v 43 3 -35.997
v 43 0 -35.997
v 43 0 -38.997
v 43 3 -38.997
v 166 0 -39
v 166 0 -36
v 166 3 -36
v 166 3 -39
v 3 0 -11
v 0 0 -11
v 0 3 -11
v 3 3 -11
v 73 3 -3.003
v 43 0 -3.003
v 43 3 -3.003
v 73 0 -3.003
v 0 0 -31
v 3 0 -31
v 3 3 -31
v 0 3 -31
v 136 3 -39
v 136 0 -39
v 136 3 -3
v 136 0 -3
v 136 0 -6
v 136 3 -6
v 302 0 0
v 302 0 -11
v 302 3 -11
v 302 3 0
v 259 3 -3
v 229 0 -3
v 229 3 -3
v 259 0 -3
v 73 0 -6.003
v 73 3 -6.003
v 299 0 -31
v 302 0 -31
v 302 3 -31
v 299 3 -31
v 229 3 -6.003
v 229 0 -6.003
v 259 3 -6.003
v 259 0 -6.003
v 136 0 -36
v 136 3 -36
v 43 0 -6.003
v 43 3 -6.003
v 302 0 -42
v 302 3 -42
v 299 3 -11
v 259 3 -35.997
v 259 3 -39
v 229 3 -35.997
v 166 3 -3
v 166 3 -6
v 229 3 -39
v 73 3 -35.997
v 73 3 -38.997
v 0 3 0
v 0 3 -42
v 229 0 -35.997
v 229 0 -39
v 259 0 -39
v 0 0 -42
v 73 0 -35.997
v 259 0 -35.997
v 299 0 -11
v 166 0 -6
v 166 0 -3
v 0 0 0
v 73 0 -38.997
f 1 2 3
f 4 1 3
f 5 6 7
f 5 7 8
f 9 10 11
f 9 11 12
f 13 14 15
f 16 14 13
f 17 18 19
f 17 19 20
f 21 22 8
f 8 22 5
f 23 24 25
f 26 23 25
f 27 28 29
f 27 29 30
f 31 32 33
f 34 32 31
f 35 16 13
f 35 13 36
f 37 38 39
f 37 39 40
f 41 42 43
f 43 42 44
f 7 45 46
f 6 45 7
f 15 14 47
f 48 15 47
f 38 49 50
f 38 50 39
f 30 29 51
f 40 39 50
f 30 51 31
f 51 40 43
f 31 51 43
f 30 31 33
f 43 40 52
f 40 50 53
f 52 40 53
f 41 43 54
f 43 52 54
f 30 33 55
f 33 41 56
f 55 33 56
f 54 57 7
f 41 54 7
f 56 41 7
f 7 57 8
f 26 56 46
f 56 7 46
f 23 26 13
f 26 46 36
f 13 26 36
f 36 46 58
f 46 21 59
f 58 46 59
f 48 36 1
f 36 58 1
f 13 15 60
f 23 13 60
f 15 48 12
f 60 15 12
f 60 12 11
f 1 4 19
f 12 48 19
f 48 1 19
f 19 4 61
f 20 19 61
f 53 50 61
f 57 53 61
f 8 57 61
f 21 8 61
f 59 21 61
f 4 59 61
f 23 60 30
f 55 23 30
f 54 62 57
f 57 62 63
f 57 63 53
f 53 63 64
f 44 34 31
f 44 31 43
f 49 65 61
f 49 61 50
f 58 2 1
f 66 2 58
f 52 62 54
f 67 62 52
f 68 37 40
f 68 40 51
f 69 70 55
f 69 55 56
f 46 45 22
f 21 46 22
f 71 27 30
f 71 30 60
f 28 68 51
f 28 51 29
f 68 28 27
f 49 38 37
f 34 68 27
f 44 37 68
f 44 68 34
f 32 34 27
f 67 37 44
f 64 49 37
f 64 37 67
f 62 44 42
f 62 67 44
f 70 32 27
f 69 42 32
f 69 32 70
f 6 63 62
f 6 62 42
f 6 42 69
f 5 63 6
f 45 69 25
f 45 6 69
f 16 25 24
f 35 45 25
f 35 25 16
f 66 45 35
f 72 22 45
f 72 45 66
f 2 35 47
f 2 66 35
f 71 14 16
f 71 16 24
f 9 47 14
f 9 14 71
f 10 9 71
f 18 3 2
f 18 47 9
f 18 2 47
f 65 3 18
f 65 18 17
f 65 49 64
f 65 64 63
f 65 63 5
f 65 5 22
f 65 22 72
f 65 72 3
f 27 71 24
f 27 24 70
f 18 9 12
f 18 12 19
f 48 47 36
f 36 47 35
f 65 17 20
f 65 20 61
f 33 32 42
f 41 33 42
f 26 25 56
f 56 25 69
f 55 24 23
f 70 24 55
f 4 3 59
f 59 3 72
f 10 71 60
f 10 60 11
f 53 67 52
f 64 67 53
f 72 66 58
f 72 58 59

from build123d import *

# Parameters (mm, degrees)
SKETCH1_W           = 30
SKETCH1_H           = 3.002768409
SKETCH1_H_2         = 3
BOSS_EXTRUDE1_DEPTH = 3


with BuildPart() as part:
    # Sketch1 → Boss-Extrude1 (new body)
    with BuildSketch(Plane(origin=(0, 0, 0), x_dir=(1, 0, 0), z_dir=(0, 1, 0))):
        Polygon((0, 31), (0, 42), (302, 42), (302, 31), (299, 31), (299, 11), (302, 11), (302, 0), (0, 0), (0, 11), (3, 11), (3, 31), align=None)
        with Locations((244, 4.501384205)):
            Rectangle(SKETCH1_W, SKETCH1_H, mode=Mode.SUBTRACT)
        with Locations((58, 37.497231591)):
            Rectangle(SKETCH1_W, SKETCH1_H_2, mode=Mode.SUBTRACT)
        with Locations((151, 37.5)):
            Rectangle(SKETCH1_W, SKETCH1_H_2, mode=Mode.SUBTRACT)
        with Locations((244, 37.498615796)):
            Rectangle(SKETCH1_W, SKETCH1_H, mode=Mode.SUBTRACT)
        with Locations((151, 4.5)):
            Rectangle(SKETCH1_W, SKETCH1_H_2, mode=Mode.SUBTRACT)
        with Locations((58, 4.502768409)):
            Rectangle(SKETCH1_W, SKETCH1_H_2, mode=Mode.SUBTRACT)
    extrude(amount=BOSS_EXTRUDE1_DEPTH)


solid = part.part
